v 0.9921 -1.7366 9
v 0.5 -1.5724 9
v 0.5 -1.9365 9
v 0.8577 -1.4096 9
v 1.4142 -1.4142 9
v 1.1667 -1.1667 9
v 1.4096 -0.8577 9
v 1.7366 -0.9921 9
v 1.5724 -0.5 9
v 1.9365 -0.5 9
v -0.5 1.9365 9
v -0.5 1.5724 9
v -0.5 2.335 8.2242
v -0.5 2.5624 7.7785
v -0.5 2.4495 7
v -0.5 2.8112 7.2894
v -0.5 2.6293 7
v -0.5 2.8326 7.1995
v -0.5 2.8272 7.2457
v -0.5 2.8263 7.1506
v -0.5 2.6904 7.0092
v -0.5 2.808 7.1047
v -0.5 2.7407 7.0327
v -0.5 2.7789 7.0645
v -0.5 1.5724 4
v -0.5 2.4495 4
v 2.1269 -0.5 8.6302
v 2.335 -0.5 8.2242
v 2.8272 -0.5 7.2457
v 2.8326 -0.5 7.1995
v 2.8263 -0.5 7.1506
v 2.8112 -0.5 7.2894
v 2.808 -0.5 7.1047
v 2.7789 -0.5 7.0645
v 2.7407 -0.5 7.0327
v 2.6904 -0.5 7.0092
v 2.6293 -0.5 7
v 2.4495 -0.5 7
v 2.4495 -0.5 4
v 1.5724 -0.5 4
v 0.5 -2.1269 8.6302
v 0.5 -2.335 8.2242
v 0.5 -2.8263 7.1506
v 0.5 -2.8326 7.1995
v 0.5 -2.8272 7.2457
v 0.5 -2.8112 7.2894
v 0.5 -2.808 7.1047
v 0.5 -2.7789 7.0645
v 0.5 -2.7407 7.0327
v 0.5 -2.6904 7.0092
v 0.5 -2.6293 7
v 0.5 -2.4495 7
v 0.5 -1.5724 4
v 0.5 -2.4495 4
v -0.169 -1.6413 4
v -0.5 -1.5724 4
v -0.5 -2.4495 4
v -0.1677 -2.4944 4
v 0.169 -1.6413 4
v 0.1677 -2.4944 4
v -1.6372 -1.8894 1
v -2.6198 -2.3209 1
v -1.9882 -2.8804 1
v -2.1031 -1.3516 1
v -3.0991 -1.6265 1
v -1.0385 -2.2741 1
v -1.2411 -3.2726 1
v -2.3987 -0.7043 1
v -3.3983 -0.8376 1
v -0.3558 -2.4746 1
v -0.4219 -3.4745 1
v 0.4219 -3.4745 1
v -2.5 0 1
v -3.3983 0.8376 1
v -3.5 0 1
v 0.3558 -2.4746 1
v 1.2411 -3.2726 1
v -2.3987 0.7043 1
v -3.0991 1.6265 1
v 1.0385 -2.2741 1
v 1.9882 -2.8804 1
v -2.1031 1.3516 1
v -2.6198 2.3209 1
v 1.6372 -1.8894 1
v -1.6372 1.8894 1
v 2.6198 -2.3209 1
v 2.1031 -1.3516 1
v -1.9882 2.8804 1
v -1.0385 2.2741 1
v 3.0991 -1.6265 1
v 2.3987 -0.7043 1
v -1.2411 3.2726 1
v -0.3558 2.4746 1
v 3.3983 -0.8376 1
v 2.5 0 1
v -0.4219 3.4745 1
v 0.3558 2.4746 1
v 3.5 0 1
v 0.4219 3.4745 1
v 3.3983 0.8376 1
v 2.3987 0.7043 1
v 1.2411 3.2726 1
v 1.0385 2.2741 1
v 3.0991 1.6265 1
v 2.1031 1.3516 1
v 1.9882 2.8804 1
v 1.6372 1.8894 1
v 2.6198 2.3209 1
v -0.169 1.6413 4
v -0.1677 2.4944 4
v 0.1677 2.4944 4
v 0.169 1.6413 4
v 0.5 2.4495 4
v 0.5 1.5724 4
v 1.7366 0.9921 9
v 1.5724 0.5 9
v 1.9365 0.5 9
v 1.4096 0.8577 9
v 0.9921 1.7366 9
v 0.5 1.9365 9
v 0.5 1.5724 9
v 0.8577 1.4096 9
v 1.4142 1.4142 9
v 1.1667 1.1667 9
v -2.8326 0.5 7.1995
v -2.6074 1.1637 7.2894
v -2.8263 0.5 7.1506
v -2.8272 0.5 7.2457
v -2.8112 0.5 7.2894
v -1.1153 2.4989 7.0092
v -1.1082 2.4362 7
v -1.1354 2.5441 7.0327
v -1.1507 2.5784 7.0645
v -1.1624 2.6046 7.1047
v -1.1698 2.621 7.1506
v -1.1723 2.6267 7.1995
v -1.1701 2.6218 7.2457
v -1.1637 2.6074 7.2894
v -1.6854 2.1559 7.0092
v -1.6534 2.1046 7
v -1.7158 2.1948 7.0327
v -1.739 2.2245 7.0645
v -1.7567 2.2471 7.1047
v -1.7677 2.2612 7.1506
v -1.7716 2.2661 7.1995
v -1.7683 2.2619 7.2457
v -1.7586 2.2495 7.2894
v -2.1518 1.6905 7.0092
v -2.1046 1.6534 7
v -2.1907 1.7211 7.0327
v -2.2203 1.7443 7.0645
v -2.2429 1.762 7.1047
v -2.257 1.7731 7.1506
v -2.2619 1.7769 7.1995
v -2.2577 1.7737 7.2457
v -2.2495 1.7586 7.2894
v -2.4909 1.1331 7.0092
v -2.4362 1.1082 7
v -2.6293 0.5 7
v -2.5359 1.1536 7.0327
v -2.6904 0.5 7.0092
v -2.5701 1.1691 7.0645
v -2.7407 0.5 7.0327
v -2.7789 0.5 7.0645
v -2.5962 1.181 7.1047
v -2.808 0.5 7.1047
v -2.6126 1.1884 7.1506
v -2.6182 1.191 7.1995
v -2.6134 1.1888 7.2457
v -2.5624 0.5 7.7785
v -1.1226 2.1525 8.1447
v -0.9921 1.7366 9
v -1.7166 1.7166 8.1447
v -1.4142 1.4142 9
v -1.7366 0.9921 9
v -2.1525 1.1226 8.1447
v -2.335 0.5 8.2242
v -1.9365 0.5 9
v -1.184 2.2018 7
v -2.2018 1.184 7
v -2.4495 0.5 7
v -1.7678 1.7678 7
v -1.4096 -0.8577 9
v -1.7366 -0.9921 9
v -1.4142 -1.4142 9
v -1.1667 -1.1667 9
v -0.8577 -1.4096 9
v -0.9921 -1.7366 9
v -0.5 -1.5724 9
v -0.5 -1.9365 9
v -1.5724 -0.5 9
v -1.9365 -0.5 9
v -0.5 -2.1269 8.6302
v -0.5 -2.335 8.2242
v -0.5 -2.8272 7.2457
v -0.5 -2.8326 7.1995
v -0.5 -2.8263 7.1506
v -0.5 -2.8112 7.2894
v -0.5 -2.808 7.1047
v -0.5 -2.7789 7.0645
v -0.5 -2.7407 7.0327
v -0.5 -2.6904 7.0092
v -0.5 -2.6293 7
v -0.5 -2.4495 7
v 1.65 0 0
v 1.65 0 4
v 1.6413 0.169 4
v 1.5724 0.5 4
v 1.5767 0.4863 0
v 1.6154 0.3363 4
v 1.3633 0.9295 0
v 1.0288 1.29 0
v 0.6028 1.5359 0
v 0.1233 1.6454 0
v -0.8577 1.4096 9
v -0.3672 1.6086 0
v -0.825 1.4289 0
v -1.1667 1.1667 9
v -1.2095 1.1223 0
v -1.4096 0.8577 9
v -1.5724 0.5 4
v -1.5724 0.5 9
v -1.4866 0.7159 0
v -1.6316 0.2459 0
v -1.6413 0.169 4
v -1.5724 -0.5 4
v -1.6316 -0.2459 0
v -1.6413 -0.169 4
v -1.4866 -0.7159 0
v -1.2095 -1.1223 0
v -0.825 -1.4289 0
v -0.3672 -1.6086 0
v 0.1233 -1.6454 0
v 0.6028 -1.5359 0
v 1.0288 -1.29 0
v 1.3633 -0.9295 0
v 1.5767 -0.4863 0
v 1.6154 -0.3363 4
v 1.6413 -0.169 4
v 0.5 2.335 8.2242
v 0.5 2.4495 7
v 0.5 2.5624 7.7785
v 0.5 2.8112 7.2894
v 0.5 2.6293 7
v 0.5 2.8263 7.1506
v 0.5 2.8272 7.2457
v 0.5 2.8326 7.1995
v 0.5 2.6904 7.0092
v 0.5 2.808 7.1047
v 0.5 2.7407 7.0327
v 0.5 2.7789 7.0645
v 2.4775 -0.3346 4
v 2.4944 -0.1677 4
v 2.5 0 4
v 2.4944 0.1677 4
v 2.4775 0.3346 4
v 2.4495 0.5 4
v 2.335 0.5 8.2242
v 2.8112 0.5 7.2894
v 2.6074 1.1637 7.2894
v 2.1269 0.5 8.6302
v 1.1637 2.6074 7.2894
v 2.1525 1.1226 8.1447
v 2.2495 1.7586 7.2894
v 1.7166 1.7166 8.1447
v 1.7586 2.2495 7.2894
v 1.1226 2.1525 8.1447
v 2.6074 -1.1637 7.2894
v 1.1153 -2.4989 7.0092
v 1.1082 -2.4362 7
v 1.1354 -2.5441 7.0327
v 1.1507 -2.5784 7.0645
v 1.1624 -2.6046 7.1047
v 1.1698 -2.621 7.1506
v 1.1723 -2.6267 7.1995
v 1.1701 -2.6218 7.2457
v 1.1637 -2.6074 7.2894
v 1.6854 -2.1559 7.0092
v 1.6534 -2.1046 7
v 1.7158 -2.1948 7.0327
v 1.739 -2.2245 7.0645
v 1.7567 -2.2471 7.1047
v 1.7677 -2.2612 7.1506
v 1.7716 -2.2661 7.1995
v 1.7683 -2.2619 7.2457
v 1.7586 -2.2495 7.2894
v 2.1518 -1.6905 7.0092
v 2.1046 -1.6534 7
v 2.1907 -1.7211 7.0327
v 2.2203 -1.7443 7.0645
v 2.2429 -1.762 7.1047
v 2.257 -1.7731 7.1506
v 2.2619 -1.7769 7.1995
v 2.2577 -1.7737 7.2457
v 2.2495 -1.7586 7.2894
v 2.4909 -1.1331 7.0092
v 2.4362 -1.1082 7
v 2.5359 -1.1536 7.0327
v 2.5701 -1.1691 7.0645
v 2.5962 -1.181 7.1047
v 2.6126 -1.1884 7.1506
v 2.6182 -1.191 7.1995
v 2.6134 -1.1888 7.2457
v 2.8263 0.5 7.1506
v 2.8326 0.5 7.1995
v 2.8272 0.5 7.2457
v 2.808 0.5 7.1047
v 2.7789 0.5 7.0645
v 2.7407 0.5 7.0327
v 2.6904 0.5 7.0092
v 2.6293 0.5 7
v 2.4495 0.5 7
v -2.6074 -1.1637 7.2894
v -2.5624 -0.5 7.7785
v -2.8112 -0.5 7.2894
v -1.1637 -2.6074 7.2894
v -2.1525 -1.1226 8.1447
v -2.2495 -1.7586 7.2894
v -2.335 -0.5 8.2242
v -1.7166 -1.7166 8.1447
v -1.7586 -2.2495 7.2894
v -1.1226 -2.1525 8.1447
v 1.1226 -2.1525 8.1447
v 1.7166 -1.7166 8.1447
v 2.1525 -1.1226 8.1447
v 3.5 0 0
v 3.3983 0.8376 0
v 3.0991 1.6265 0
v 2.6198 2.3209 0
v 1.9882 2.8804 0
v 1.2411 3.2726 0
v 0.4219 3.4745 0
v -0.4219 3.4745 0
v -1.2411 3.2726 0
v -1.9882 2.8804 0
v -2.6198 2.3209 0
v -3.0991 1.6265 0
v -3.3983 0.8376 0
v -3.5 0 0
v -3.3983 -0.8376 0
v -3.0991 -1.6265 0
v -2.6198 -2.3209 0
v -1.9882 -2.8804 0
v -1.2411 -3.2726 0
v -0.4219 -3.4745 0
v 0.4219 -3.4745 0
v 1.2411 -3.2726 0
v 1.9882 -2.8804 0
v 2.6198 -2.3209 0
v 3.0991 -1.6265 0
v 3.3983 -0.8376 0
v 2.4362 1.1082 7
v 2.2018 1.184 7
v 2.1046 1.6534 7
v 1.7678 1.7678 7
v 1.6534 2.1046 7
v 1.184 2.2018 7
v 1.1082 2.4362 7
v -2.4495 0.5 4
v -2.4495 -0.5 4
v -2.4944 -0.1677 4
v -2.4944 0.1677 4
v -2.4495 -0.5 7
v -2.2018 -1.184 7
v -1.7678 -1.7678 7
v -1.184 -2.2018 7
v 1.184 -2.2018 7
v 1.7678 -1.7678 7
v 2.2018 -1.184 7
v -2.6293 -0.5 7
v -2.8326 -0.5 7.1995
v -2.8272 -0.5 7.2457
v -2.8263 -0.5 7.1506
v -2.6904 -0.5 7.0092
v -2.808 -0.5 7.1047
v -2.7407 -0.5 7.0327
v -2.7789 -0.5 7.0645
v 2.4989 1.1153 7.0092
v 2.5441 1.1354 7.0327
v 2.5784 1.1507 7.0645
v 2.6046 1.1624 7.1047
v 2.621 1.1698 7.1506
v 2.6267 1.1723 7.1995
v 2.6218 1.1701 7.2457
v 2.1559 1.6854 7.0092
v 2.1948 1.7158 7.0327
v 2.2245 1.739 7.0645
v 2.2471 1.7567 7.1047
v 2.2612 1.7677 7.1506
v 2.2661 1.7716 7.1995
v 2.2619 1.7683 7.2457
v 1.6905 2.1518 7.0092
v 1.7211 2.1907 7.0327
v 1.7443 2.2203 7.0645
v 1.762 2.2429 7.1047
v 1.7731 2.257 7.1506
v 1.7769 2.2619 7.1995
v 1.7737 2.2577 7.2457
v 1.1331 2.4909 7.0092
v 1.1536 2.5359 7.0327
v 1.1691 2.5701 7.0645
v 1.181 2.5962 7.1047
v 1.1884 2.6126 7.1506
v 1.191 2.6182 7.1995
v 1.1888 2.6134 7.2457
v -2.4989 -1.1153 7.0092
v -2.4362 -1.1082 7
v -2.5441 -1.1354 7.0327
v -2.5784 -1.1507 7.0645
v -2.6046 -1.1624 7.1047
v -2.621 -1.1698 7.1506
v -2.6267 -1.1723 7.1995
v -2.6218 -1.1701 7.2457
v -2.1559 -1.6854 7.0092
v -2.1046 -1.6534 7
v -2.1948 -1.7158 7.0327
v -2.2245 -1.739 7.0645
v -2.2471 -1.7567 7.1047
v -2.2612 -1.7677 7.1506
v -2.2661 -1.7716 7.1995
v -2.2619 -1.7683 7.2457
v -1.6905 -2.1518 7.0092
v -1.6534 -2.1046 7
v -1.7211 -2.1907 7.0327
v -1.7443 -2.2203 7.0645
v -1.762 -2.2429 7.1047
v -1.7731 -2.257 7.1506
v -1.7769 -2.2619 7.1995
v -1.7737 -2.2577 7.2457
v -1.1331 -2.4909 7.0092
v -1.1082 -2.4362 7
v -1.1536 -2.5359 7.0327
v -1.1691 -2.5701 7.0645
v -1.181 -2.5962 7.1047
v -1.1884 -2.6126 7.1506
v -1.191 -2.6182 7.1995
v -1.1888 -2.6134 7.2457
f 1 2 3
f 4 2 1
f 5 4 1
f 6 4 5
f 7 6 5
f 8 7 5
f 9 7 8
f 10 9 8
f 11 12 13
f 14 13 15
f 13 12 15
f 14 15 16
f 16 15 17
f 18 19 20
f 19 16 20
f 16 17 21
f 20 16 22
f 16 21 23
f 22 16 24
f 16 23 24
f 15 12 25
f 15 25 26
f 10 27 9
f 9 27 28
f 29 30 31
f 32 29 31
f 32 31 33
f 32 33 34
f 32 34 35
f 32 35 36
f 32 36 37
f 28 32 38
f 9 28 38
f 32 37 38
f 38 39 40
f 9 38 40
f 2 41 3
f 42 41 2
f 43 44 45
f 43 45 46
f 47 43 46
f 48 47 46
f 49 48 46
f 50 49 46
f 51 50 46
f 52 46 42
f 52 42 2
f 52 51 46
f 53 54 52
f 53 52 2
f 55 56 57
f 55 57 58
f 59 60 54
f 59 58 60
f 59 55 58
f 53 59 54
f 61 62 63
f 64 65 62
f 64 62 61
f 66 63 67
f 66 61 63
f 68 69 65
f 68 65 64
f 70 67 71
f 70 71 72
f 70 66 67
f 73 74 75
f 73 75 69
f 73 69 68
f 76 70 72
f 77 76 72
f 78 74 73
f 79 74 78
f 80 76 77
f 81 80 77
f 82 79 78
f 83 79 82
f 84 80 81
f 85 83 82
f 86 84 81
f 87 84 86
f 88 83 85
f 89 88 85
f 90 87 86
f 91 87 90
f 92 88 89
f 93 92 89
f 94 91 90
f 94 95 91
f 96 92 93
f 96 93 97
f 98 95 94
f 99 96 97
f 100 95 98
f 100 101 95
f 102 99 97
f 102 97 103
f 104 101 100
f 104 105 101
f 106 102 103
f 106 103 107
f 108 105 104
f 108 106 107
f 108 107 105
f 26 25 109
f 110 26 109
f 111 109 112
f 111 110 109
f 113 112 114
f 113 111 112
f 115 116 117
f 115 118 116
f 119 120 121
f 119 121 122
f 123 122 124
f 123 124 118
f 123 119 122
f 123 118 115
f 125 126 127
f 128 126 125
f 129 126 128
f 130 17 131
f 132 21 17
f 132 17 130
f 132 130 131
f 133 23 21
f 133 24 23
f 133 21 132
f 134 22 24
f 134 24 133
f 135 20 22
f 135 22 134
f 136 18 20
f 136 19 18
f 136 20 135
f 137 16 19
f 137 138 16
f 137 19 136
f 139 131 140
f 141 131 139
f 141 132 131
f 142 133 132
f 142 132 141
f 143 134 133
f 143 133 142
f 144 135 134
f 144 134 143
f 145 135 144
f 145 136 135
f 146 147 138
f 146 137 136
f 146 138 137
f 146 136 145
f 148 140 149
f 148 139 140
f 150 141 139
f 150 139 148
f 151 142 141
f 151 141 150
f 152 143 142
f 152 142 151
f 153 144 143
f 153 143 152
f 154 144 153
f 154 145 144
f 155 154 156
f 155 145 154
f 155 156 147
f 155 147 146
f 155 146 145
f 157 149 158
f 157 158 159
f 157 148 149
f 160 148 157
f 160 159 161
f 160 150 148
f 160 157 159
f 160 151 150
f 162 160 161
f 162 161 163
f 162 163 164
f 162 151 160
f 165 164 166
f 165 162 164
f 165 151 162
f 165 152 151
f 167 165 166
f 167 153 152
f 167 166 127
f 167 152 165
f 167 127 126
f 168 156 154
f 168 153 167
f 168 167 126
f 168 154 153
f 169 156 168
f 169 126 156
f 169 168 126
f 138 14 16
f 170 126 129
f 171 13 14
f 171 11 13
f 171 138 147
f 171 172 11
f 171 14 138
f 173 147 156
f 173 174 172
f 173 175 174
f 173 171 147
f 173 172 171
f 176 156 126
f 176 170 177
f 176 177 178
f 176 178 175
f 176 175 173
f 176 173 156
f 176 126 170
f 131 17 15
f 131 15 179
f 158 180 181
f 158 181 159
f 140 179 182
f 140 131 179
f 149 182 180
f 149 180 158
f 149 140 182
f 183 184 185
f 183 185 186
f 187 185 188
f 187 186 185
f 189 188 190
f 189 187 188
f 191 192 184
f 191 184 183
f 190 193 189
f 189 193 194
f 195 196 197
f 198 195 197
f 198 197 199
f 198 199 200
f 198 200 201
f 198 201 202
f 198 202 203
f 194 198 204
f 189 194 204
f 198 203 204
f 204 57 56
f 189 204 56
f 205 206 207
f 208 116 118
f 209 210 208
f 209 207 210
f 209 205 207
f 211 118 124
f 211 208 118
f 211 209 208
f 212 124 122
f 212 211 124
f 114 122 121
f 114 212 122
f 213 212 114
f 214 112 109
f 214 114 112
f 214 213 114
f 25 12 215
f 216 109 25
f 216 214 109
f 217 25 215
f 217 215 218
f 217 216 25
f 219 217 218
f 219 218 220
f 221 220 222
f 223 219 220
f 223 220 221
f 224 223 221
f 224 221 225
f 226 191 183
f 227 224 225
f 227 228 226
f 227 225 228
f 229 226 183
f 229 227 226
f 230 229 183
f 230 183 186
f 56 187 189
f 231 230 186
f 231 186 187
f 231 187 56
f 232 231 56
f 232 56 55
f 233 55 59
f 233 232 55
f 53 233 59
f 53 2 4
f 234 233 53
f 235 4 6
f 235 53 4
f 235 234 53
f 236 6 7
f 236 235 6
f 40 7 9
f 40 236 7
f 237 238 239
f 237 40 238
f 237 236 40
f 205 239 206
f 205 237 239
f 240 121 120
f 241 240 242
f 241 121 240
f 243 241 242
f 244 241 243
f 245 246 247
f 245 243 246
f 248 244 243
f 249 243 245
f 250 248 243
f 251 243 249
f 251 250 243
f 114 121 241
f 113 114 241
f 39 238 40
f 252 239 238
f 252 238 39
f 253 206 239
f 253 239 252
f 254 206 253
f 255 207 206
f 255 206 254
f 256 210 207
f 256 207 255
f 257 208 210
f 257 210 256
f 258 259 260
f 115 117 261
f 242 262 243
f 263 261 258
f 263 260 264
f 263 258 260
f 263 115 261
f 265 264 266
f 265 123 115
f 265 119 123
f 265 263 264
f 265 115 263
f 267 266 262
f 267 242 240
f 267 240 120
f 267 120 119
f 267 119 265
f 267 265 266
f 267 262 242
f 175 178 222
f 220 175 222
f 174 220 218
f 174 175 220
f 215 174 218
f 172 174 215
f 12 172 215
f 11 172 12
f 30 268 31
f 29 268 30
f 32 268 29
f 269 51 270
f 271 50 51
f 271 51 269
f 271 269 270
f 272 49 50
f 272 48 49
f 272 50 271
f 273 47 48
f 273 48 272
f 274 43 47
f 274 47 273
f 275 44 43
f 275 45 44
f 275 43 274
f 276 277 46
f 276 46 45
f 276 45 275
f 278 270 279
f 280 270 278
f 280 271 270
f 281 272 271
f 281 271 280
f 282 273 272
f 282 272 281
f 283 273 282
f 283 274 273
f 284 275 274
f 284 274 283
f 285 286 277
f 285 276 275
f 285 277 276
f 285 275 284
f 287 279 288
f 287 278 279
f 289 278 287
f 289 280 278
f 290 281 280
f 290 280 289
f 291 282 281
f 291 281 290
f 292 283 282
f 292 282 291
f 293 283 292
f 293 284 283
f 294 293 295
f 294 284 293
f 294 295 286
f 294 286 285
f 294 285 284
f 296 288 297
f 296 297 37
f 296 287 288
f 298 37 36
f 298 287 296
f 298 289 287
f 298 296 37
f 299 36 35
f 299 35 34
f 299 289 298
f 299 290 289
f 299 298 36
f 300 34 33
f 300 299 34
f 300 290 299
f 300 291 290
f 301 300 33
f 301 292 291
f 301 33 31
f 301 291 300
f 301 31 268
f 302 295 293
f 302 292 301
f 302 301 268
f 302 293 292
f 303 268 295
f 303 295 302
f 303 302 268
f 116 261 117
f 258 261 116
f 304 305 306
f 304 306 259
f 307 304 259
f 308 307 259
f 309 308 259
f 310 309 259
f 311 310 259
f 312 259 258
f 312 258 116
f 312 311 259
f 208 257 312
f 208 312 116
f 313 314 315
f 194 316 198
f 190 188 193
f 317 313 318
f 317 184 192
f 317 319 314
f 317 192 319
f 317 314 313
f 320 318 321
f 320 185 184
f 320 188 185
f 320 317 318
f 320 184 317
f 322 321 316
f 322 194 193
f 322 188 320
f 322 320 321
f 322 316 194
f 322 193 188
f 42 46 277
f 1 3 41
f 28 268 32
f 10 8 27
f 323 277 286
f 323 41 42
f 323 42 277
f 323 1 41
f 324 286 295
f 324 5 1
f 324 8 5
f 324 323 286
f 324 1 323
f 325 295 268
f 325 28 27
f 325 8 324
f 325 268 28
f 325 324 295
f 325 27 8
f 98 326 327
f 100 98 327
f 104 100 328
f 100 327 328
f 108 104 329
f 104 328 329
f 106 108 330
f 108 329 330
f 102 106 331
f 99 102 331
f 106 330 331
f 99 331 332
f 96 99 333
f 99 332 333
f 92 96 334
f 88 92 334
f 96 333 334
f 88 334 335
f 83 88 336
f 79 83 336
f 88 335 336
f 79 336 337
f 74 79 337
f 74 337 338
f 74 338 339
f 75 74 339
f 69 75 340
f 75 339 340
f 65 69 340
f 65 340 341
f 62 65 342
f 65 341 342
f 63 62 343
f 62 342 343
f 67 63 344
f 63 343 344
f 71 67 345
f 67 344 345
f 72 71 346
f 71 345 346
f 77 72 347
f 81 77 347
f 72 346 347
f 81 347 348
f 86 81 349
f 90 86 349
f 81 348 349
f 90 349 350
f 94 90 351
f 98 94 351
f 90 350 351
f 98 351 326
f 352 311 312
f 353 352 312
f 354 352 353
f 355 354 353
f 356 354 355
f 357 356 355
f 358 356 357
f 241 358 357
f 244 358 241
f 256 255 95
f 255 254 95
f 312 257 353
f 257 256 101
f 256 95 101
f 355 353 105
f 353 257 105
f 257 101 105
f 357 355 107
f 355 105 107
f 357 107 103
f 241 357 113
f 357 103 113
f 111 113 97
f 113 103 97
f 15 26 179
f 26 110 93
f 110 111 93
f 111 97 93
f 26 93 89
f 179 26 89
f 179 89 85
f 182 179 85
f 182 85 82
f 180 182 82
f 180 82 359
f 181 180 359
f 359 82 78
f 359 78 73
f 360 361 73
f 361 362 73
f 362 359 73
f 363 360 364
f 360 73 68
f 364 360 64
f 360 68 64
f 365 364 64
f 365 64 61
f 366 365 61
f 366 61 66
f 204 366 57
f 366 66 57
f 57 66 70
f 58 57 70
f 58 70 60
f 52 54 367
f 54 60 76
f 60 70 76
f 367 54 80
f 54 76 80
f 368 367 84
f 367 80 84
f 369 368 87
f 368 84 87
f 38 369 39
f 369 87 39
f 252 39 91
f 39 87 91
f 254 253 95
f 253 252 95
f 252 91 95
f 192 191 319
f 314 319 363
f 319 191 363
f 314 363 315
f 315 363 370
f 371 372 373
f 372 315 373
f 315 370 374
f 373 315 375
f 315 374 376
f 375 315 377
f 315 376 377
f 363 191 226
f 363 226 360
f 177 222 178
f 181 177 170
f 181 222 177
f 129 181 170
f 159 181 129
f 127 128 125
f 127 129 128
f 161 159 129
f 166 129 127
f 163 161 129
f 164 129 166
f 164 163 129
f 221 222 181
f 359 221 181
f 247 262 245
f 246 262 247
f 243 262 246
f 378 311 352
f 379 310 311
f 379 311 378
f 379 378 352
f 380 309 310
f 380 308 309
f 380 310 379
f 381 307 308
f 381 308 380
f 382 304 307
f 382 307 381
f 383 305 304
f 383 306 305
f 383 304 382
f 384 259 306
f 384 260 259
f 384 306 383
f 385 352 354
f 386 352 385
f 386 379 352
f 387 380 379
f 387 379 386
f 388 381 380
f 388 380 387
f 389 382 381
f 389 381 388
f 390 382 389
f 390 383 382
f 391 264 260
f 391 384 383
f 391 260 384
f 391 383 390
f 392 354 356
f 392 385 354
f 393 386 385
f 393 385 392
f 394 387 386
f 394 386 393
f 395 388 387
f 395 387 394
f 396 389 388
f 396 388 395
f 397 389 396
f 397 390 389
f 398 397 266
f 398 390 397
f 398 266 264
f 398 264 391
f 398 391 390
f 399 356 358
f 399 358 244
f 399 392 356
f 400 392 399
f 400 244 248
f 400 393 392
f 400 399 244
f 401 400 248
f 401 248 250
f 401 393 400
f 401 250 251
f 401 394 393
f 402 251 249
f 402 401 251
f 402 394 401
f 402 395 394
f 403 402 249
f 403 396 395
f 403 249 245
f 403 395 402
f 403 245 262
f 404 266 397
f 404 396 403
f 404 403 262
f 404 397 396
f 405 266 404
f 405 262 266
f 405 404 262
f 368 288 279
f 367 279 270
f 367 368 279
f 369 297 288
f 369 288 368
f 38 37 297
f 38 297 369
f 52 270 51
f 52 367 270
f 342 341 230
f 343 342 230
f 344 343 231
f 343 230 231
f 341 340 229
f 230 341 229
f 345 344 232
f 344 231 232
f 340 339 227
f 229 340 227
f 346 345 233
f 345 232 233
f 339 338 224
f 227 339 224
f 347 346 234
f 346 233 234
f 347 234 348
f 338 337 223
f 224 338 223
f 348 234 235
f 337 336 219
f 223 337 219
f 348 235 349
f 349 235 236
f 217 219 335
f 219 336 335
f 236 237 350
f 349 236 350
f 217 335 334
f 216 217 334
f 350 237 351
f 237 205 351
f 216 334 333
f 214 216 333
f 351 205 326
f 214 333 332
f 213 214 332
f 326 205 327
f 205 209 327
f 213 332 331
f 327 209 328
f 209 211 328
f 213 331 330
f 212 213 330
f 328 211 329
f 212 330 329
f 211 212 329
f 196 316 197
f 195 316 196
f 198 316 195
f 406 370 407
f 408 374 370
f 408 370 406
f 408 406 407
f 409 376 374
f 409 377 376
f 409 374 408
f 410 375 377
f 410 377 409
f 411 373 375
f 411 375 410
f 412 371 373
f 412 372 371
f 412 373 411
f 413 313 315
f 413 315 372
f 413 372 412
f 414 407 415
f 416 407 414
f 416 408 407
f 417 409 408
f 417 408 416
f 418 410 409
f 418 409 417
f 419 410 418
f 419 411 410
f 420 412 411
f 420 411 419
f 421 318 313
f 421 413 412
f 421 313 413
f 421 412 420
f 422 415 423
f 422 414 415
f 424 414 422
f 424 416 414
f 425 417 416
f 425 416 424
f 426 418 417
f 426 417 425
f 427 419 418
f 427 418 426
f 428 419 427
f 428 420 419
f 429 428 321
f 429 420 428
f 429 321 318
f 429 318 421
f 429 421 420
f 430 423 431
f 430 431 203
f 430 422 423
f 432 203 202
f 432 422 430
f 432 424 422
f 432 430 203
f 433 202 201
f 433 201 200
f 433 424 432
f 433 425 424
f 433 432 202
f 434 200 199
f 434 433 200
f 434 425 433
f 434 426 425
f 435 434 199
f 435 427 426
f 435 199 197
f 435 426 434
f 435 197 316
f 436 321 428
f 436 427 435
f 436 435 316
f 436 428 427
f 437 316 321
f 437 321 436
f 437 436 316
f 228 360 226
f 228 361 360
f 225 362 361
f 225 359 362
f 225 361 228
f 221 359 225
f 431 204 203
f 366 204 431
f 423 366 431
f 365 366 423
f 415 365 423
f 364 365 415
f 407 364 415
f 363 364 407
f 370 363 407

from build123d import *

# Parameters (mm, degrees)
BOX002_W               = 1
BOX002_H               = 10
BOX002_DEPTH           = 10
BOX003_W               = 1
BOX003_H               = 10
BOX003_DEPTH           = 10
BOX003_PLACEMENT_ANGLE = 90
CYLINDER013_R          = 1.65
CYLINDER013_DEPTH      = 14
CYLINDER011_R          = 2.5
CYLINDER011_DEPTH      = 7.5
CYLINDER012_R          = 3.5
CYLINDER012_DEPTH      = 1
FILLET002_R            = 0.2


with BuildPart() as cube002:
    # Box002 → Box002 (new body)
    with BuildSketch(Plane(origin=(-0.5, -5, 0), x_dir=(1, 0, 0), z_dir=(0, 0, 1))):
        with Locations((0.5, 5)):
            Rectangle(BOX002_W, BOX002_H)
    extrude(amount=BOX002_DEPTH)


with BuildPart() as fusion011:
    # Box003 → Box003 (new body)
    with BuildSketch(Plane.XY):
        with Locations((0.5, 5)):
            Rectangle(BOX003_W, BOX003_H)
    extrude(amount=BOX003_DEPTH)


with BuildPart() as fusion011_1:
    # Box003 placement: moved
    add(fusion011.part.moved(Location((5, -0.5, 0))).rotate(Axis((5, -0.5, 0), (0, 0, 1)), BOX003_PLACEMENT_ANGLE))

    # Fusion011: union Cube002
    add(cube002.part)


with BuildPart() as fusion011_2:
    # Fusion011 placement: moved
    add(fusion011_1.part.moved(Location((0, 0, 4))))


with BuildPart() as cylinder013:
    # Cylinder013 → Cylinder013 (new body)
    with BuildSketch(Plane.XY.offset(-1)):
        Circle(CYLINDER013_R)
    extrude(amount=CYLINDER013_DEPTH)


with BuildPart() as cylinder011:
    # Cylinder011 → Cylinder011 (new body)
    with BuildSketch(Plane.XY):
        Circle(CYLINDER011_R)
    extrude(amount=CYLINDER011_DEPTH)


with BuildPart() as cylinder012:
    # Cylinder012 → Cylinder012 (new body)
    with BuildSketch(Plane.XY):
        Circle(CYLINDER012_R)
    extrude(amount=CYLINDER012_DEPTH)


with BuildPart() as cut008:
    # Cone → Cone (revolve)
    with BuildSketch(Plane(origin=(0, 0, 7), x_dir=(1, 0, 0), z_dir=(0, -1, 0))):
        Polygon((0, 0), (3, 0), (2, 2), (0, 2), align=None)
    revolve(axis=Axis((0, 0, 7), (0, 0, 1)))

    # Fillet002
    fillet002_edges = [cut008.edges().sort_by_distance(p)[0] for p in [
        (-3, 0, 7),
    ]]
    fillet(fillet002_edges, radius=FILLET002_R)

    # Fusion012: union Cylinder011, Cylinder012
    add(cylinder011.part)
    add(cylinder012.part)

    # Cut007: cut Cylinder013
    add(cylinder013.part, mode=Mode.SUBTRACT)

    # Cut008: cut Fusion011
    add(fusion011_2.part, mode=Mode.SUBTRACT)


solid = cut008.part
